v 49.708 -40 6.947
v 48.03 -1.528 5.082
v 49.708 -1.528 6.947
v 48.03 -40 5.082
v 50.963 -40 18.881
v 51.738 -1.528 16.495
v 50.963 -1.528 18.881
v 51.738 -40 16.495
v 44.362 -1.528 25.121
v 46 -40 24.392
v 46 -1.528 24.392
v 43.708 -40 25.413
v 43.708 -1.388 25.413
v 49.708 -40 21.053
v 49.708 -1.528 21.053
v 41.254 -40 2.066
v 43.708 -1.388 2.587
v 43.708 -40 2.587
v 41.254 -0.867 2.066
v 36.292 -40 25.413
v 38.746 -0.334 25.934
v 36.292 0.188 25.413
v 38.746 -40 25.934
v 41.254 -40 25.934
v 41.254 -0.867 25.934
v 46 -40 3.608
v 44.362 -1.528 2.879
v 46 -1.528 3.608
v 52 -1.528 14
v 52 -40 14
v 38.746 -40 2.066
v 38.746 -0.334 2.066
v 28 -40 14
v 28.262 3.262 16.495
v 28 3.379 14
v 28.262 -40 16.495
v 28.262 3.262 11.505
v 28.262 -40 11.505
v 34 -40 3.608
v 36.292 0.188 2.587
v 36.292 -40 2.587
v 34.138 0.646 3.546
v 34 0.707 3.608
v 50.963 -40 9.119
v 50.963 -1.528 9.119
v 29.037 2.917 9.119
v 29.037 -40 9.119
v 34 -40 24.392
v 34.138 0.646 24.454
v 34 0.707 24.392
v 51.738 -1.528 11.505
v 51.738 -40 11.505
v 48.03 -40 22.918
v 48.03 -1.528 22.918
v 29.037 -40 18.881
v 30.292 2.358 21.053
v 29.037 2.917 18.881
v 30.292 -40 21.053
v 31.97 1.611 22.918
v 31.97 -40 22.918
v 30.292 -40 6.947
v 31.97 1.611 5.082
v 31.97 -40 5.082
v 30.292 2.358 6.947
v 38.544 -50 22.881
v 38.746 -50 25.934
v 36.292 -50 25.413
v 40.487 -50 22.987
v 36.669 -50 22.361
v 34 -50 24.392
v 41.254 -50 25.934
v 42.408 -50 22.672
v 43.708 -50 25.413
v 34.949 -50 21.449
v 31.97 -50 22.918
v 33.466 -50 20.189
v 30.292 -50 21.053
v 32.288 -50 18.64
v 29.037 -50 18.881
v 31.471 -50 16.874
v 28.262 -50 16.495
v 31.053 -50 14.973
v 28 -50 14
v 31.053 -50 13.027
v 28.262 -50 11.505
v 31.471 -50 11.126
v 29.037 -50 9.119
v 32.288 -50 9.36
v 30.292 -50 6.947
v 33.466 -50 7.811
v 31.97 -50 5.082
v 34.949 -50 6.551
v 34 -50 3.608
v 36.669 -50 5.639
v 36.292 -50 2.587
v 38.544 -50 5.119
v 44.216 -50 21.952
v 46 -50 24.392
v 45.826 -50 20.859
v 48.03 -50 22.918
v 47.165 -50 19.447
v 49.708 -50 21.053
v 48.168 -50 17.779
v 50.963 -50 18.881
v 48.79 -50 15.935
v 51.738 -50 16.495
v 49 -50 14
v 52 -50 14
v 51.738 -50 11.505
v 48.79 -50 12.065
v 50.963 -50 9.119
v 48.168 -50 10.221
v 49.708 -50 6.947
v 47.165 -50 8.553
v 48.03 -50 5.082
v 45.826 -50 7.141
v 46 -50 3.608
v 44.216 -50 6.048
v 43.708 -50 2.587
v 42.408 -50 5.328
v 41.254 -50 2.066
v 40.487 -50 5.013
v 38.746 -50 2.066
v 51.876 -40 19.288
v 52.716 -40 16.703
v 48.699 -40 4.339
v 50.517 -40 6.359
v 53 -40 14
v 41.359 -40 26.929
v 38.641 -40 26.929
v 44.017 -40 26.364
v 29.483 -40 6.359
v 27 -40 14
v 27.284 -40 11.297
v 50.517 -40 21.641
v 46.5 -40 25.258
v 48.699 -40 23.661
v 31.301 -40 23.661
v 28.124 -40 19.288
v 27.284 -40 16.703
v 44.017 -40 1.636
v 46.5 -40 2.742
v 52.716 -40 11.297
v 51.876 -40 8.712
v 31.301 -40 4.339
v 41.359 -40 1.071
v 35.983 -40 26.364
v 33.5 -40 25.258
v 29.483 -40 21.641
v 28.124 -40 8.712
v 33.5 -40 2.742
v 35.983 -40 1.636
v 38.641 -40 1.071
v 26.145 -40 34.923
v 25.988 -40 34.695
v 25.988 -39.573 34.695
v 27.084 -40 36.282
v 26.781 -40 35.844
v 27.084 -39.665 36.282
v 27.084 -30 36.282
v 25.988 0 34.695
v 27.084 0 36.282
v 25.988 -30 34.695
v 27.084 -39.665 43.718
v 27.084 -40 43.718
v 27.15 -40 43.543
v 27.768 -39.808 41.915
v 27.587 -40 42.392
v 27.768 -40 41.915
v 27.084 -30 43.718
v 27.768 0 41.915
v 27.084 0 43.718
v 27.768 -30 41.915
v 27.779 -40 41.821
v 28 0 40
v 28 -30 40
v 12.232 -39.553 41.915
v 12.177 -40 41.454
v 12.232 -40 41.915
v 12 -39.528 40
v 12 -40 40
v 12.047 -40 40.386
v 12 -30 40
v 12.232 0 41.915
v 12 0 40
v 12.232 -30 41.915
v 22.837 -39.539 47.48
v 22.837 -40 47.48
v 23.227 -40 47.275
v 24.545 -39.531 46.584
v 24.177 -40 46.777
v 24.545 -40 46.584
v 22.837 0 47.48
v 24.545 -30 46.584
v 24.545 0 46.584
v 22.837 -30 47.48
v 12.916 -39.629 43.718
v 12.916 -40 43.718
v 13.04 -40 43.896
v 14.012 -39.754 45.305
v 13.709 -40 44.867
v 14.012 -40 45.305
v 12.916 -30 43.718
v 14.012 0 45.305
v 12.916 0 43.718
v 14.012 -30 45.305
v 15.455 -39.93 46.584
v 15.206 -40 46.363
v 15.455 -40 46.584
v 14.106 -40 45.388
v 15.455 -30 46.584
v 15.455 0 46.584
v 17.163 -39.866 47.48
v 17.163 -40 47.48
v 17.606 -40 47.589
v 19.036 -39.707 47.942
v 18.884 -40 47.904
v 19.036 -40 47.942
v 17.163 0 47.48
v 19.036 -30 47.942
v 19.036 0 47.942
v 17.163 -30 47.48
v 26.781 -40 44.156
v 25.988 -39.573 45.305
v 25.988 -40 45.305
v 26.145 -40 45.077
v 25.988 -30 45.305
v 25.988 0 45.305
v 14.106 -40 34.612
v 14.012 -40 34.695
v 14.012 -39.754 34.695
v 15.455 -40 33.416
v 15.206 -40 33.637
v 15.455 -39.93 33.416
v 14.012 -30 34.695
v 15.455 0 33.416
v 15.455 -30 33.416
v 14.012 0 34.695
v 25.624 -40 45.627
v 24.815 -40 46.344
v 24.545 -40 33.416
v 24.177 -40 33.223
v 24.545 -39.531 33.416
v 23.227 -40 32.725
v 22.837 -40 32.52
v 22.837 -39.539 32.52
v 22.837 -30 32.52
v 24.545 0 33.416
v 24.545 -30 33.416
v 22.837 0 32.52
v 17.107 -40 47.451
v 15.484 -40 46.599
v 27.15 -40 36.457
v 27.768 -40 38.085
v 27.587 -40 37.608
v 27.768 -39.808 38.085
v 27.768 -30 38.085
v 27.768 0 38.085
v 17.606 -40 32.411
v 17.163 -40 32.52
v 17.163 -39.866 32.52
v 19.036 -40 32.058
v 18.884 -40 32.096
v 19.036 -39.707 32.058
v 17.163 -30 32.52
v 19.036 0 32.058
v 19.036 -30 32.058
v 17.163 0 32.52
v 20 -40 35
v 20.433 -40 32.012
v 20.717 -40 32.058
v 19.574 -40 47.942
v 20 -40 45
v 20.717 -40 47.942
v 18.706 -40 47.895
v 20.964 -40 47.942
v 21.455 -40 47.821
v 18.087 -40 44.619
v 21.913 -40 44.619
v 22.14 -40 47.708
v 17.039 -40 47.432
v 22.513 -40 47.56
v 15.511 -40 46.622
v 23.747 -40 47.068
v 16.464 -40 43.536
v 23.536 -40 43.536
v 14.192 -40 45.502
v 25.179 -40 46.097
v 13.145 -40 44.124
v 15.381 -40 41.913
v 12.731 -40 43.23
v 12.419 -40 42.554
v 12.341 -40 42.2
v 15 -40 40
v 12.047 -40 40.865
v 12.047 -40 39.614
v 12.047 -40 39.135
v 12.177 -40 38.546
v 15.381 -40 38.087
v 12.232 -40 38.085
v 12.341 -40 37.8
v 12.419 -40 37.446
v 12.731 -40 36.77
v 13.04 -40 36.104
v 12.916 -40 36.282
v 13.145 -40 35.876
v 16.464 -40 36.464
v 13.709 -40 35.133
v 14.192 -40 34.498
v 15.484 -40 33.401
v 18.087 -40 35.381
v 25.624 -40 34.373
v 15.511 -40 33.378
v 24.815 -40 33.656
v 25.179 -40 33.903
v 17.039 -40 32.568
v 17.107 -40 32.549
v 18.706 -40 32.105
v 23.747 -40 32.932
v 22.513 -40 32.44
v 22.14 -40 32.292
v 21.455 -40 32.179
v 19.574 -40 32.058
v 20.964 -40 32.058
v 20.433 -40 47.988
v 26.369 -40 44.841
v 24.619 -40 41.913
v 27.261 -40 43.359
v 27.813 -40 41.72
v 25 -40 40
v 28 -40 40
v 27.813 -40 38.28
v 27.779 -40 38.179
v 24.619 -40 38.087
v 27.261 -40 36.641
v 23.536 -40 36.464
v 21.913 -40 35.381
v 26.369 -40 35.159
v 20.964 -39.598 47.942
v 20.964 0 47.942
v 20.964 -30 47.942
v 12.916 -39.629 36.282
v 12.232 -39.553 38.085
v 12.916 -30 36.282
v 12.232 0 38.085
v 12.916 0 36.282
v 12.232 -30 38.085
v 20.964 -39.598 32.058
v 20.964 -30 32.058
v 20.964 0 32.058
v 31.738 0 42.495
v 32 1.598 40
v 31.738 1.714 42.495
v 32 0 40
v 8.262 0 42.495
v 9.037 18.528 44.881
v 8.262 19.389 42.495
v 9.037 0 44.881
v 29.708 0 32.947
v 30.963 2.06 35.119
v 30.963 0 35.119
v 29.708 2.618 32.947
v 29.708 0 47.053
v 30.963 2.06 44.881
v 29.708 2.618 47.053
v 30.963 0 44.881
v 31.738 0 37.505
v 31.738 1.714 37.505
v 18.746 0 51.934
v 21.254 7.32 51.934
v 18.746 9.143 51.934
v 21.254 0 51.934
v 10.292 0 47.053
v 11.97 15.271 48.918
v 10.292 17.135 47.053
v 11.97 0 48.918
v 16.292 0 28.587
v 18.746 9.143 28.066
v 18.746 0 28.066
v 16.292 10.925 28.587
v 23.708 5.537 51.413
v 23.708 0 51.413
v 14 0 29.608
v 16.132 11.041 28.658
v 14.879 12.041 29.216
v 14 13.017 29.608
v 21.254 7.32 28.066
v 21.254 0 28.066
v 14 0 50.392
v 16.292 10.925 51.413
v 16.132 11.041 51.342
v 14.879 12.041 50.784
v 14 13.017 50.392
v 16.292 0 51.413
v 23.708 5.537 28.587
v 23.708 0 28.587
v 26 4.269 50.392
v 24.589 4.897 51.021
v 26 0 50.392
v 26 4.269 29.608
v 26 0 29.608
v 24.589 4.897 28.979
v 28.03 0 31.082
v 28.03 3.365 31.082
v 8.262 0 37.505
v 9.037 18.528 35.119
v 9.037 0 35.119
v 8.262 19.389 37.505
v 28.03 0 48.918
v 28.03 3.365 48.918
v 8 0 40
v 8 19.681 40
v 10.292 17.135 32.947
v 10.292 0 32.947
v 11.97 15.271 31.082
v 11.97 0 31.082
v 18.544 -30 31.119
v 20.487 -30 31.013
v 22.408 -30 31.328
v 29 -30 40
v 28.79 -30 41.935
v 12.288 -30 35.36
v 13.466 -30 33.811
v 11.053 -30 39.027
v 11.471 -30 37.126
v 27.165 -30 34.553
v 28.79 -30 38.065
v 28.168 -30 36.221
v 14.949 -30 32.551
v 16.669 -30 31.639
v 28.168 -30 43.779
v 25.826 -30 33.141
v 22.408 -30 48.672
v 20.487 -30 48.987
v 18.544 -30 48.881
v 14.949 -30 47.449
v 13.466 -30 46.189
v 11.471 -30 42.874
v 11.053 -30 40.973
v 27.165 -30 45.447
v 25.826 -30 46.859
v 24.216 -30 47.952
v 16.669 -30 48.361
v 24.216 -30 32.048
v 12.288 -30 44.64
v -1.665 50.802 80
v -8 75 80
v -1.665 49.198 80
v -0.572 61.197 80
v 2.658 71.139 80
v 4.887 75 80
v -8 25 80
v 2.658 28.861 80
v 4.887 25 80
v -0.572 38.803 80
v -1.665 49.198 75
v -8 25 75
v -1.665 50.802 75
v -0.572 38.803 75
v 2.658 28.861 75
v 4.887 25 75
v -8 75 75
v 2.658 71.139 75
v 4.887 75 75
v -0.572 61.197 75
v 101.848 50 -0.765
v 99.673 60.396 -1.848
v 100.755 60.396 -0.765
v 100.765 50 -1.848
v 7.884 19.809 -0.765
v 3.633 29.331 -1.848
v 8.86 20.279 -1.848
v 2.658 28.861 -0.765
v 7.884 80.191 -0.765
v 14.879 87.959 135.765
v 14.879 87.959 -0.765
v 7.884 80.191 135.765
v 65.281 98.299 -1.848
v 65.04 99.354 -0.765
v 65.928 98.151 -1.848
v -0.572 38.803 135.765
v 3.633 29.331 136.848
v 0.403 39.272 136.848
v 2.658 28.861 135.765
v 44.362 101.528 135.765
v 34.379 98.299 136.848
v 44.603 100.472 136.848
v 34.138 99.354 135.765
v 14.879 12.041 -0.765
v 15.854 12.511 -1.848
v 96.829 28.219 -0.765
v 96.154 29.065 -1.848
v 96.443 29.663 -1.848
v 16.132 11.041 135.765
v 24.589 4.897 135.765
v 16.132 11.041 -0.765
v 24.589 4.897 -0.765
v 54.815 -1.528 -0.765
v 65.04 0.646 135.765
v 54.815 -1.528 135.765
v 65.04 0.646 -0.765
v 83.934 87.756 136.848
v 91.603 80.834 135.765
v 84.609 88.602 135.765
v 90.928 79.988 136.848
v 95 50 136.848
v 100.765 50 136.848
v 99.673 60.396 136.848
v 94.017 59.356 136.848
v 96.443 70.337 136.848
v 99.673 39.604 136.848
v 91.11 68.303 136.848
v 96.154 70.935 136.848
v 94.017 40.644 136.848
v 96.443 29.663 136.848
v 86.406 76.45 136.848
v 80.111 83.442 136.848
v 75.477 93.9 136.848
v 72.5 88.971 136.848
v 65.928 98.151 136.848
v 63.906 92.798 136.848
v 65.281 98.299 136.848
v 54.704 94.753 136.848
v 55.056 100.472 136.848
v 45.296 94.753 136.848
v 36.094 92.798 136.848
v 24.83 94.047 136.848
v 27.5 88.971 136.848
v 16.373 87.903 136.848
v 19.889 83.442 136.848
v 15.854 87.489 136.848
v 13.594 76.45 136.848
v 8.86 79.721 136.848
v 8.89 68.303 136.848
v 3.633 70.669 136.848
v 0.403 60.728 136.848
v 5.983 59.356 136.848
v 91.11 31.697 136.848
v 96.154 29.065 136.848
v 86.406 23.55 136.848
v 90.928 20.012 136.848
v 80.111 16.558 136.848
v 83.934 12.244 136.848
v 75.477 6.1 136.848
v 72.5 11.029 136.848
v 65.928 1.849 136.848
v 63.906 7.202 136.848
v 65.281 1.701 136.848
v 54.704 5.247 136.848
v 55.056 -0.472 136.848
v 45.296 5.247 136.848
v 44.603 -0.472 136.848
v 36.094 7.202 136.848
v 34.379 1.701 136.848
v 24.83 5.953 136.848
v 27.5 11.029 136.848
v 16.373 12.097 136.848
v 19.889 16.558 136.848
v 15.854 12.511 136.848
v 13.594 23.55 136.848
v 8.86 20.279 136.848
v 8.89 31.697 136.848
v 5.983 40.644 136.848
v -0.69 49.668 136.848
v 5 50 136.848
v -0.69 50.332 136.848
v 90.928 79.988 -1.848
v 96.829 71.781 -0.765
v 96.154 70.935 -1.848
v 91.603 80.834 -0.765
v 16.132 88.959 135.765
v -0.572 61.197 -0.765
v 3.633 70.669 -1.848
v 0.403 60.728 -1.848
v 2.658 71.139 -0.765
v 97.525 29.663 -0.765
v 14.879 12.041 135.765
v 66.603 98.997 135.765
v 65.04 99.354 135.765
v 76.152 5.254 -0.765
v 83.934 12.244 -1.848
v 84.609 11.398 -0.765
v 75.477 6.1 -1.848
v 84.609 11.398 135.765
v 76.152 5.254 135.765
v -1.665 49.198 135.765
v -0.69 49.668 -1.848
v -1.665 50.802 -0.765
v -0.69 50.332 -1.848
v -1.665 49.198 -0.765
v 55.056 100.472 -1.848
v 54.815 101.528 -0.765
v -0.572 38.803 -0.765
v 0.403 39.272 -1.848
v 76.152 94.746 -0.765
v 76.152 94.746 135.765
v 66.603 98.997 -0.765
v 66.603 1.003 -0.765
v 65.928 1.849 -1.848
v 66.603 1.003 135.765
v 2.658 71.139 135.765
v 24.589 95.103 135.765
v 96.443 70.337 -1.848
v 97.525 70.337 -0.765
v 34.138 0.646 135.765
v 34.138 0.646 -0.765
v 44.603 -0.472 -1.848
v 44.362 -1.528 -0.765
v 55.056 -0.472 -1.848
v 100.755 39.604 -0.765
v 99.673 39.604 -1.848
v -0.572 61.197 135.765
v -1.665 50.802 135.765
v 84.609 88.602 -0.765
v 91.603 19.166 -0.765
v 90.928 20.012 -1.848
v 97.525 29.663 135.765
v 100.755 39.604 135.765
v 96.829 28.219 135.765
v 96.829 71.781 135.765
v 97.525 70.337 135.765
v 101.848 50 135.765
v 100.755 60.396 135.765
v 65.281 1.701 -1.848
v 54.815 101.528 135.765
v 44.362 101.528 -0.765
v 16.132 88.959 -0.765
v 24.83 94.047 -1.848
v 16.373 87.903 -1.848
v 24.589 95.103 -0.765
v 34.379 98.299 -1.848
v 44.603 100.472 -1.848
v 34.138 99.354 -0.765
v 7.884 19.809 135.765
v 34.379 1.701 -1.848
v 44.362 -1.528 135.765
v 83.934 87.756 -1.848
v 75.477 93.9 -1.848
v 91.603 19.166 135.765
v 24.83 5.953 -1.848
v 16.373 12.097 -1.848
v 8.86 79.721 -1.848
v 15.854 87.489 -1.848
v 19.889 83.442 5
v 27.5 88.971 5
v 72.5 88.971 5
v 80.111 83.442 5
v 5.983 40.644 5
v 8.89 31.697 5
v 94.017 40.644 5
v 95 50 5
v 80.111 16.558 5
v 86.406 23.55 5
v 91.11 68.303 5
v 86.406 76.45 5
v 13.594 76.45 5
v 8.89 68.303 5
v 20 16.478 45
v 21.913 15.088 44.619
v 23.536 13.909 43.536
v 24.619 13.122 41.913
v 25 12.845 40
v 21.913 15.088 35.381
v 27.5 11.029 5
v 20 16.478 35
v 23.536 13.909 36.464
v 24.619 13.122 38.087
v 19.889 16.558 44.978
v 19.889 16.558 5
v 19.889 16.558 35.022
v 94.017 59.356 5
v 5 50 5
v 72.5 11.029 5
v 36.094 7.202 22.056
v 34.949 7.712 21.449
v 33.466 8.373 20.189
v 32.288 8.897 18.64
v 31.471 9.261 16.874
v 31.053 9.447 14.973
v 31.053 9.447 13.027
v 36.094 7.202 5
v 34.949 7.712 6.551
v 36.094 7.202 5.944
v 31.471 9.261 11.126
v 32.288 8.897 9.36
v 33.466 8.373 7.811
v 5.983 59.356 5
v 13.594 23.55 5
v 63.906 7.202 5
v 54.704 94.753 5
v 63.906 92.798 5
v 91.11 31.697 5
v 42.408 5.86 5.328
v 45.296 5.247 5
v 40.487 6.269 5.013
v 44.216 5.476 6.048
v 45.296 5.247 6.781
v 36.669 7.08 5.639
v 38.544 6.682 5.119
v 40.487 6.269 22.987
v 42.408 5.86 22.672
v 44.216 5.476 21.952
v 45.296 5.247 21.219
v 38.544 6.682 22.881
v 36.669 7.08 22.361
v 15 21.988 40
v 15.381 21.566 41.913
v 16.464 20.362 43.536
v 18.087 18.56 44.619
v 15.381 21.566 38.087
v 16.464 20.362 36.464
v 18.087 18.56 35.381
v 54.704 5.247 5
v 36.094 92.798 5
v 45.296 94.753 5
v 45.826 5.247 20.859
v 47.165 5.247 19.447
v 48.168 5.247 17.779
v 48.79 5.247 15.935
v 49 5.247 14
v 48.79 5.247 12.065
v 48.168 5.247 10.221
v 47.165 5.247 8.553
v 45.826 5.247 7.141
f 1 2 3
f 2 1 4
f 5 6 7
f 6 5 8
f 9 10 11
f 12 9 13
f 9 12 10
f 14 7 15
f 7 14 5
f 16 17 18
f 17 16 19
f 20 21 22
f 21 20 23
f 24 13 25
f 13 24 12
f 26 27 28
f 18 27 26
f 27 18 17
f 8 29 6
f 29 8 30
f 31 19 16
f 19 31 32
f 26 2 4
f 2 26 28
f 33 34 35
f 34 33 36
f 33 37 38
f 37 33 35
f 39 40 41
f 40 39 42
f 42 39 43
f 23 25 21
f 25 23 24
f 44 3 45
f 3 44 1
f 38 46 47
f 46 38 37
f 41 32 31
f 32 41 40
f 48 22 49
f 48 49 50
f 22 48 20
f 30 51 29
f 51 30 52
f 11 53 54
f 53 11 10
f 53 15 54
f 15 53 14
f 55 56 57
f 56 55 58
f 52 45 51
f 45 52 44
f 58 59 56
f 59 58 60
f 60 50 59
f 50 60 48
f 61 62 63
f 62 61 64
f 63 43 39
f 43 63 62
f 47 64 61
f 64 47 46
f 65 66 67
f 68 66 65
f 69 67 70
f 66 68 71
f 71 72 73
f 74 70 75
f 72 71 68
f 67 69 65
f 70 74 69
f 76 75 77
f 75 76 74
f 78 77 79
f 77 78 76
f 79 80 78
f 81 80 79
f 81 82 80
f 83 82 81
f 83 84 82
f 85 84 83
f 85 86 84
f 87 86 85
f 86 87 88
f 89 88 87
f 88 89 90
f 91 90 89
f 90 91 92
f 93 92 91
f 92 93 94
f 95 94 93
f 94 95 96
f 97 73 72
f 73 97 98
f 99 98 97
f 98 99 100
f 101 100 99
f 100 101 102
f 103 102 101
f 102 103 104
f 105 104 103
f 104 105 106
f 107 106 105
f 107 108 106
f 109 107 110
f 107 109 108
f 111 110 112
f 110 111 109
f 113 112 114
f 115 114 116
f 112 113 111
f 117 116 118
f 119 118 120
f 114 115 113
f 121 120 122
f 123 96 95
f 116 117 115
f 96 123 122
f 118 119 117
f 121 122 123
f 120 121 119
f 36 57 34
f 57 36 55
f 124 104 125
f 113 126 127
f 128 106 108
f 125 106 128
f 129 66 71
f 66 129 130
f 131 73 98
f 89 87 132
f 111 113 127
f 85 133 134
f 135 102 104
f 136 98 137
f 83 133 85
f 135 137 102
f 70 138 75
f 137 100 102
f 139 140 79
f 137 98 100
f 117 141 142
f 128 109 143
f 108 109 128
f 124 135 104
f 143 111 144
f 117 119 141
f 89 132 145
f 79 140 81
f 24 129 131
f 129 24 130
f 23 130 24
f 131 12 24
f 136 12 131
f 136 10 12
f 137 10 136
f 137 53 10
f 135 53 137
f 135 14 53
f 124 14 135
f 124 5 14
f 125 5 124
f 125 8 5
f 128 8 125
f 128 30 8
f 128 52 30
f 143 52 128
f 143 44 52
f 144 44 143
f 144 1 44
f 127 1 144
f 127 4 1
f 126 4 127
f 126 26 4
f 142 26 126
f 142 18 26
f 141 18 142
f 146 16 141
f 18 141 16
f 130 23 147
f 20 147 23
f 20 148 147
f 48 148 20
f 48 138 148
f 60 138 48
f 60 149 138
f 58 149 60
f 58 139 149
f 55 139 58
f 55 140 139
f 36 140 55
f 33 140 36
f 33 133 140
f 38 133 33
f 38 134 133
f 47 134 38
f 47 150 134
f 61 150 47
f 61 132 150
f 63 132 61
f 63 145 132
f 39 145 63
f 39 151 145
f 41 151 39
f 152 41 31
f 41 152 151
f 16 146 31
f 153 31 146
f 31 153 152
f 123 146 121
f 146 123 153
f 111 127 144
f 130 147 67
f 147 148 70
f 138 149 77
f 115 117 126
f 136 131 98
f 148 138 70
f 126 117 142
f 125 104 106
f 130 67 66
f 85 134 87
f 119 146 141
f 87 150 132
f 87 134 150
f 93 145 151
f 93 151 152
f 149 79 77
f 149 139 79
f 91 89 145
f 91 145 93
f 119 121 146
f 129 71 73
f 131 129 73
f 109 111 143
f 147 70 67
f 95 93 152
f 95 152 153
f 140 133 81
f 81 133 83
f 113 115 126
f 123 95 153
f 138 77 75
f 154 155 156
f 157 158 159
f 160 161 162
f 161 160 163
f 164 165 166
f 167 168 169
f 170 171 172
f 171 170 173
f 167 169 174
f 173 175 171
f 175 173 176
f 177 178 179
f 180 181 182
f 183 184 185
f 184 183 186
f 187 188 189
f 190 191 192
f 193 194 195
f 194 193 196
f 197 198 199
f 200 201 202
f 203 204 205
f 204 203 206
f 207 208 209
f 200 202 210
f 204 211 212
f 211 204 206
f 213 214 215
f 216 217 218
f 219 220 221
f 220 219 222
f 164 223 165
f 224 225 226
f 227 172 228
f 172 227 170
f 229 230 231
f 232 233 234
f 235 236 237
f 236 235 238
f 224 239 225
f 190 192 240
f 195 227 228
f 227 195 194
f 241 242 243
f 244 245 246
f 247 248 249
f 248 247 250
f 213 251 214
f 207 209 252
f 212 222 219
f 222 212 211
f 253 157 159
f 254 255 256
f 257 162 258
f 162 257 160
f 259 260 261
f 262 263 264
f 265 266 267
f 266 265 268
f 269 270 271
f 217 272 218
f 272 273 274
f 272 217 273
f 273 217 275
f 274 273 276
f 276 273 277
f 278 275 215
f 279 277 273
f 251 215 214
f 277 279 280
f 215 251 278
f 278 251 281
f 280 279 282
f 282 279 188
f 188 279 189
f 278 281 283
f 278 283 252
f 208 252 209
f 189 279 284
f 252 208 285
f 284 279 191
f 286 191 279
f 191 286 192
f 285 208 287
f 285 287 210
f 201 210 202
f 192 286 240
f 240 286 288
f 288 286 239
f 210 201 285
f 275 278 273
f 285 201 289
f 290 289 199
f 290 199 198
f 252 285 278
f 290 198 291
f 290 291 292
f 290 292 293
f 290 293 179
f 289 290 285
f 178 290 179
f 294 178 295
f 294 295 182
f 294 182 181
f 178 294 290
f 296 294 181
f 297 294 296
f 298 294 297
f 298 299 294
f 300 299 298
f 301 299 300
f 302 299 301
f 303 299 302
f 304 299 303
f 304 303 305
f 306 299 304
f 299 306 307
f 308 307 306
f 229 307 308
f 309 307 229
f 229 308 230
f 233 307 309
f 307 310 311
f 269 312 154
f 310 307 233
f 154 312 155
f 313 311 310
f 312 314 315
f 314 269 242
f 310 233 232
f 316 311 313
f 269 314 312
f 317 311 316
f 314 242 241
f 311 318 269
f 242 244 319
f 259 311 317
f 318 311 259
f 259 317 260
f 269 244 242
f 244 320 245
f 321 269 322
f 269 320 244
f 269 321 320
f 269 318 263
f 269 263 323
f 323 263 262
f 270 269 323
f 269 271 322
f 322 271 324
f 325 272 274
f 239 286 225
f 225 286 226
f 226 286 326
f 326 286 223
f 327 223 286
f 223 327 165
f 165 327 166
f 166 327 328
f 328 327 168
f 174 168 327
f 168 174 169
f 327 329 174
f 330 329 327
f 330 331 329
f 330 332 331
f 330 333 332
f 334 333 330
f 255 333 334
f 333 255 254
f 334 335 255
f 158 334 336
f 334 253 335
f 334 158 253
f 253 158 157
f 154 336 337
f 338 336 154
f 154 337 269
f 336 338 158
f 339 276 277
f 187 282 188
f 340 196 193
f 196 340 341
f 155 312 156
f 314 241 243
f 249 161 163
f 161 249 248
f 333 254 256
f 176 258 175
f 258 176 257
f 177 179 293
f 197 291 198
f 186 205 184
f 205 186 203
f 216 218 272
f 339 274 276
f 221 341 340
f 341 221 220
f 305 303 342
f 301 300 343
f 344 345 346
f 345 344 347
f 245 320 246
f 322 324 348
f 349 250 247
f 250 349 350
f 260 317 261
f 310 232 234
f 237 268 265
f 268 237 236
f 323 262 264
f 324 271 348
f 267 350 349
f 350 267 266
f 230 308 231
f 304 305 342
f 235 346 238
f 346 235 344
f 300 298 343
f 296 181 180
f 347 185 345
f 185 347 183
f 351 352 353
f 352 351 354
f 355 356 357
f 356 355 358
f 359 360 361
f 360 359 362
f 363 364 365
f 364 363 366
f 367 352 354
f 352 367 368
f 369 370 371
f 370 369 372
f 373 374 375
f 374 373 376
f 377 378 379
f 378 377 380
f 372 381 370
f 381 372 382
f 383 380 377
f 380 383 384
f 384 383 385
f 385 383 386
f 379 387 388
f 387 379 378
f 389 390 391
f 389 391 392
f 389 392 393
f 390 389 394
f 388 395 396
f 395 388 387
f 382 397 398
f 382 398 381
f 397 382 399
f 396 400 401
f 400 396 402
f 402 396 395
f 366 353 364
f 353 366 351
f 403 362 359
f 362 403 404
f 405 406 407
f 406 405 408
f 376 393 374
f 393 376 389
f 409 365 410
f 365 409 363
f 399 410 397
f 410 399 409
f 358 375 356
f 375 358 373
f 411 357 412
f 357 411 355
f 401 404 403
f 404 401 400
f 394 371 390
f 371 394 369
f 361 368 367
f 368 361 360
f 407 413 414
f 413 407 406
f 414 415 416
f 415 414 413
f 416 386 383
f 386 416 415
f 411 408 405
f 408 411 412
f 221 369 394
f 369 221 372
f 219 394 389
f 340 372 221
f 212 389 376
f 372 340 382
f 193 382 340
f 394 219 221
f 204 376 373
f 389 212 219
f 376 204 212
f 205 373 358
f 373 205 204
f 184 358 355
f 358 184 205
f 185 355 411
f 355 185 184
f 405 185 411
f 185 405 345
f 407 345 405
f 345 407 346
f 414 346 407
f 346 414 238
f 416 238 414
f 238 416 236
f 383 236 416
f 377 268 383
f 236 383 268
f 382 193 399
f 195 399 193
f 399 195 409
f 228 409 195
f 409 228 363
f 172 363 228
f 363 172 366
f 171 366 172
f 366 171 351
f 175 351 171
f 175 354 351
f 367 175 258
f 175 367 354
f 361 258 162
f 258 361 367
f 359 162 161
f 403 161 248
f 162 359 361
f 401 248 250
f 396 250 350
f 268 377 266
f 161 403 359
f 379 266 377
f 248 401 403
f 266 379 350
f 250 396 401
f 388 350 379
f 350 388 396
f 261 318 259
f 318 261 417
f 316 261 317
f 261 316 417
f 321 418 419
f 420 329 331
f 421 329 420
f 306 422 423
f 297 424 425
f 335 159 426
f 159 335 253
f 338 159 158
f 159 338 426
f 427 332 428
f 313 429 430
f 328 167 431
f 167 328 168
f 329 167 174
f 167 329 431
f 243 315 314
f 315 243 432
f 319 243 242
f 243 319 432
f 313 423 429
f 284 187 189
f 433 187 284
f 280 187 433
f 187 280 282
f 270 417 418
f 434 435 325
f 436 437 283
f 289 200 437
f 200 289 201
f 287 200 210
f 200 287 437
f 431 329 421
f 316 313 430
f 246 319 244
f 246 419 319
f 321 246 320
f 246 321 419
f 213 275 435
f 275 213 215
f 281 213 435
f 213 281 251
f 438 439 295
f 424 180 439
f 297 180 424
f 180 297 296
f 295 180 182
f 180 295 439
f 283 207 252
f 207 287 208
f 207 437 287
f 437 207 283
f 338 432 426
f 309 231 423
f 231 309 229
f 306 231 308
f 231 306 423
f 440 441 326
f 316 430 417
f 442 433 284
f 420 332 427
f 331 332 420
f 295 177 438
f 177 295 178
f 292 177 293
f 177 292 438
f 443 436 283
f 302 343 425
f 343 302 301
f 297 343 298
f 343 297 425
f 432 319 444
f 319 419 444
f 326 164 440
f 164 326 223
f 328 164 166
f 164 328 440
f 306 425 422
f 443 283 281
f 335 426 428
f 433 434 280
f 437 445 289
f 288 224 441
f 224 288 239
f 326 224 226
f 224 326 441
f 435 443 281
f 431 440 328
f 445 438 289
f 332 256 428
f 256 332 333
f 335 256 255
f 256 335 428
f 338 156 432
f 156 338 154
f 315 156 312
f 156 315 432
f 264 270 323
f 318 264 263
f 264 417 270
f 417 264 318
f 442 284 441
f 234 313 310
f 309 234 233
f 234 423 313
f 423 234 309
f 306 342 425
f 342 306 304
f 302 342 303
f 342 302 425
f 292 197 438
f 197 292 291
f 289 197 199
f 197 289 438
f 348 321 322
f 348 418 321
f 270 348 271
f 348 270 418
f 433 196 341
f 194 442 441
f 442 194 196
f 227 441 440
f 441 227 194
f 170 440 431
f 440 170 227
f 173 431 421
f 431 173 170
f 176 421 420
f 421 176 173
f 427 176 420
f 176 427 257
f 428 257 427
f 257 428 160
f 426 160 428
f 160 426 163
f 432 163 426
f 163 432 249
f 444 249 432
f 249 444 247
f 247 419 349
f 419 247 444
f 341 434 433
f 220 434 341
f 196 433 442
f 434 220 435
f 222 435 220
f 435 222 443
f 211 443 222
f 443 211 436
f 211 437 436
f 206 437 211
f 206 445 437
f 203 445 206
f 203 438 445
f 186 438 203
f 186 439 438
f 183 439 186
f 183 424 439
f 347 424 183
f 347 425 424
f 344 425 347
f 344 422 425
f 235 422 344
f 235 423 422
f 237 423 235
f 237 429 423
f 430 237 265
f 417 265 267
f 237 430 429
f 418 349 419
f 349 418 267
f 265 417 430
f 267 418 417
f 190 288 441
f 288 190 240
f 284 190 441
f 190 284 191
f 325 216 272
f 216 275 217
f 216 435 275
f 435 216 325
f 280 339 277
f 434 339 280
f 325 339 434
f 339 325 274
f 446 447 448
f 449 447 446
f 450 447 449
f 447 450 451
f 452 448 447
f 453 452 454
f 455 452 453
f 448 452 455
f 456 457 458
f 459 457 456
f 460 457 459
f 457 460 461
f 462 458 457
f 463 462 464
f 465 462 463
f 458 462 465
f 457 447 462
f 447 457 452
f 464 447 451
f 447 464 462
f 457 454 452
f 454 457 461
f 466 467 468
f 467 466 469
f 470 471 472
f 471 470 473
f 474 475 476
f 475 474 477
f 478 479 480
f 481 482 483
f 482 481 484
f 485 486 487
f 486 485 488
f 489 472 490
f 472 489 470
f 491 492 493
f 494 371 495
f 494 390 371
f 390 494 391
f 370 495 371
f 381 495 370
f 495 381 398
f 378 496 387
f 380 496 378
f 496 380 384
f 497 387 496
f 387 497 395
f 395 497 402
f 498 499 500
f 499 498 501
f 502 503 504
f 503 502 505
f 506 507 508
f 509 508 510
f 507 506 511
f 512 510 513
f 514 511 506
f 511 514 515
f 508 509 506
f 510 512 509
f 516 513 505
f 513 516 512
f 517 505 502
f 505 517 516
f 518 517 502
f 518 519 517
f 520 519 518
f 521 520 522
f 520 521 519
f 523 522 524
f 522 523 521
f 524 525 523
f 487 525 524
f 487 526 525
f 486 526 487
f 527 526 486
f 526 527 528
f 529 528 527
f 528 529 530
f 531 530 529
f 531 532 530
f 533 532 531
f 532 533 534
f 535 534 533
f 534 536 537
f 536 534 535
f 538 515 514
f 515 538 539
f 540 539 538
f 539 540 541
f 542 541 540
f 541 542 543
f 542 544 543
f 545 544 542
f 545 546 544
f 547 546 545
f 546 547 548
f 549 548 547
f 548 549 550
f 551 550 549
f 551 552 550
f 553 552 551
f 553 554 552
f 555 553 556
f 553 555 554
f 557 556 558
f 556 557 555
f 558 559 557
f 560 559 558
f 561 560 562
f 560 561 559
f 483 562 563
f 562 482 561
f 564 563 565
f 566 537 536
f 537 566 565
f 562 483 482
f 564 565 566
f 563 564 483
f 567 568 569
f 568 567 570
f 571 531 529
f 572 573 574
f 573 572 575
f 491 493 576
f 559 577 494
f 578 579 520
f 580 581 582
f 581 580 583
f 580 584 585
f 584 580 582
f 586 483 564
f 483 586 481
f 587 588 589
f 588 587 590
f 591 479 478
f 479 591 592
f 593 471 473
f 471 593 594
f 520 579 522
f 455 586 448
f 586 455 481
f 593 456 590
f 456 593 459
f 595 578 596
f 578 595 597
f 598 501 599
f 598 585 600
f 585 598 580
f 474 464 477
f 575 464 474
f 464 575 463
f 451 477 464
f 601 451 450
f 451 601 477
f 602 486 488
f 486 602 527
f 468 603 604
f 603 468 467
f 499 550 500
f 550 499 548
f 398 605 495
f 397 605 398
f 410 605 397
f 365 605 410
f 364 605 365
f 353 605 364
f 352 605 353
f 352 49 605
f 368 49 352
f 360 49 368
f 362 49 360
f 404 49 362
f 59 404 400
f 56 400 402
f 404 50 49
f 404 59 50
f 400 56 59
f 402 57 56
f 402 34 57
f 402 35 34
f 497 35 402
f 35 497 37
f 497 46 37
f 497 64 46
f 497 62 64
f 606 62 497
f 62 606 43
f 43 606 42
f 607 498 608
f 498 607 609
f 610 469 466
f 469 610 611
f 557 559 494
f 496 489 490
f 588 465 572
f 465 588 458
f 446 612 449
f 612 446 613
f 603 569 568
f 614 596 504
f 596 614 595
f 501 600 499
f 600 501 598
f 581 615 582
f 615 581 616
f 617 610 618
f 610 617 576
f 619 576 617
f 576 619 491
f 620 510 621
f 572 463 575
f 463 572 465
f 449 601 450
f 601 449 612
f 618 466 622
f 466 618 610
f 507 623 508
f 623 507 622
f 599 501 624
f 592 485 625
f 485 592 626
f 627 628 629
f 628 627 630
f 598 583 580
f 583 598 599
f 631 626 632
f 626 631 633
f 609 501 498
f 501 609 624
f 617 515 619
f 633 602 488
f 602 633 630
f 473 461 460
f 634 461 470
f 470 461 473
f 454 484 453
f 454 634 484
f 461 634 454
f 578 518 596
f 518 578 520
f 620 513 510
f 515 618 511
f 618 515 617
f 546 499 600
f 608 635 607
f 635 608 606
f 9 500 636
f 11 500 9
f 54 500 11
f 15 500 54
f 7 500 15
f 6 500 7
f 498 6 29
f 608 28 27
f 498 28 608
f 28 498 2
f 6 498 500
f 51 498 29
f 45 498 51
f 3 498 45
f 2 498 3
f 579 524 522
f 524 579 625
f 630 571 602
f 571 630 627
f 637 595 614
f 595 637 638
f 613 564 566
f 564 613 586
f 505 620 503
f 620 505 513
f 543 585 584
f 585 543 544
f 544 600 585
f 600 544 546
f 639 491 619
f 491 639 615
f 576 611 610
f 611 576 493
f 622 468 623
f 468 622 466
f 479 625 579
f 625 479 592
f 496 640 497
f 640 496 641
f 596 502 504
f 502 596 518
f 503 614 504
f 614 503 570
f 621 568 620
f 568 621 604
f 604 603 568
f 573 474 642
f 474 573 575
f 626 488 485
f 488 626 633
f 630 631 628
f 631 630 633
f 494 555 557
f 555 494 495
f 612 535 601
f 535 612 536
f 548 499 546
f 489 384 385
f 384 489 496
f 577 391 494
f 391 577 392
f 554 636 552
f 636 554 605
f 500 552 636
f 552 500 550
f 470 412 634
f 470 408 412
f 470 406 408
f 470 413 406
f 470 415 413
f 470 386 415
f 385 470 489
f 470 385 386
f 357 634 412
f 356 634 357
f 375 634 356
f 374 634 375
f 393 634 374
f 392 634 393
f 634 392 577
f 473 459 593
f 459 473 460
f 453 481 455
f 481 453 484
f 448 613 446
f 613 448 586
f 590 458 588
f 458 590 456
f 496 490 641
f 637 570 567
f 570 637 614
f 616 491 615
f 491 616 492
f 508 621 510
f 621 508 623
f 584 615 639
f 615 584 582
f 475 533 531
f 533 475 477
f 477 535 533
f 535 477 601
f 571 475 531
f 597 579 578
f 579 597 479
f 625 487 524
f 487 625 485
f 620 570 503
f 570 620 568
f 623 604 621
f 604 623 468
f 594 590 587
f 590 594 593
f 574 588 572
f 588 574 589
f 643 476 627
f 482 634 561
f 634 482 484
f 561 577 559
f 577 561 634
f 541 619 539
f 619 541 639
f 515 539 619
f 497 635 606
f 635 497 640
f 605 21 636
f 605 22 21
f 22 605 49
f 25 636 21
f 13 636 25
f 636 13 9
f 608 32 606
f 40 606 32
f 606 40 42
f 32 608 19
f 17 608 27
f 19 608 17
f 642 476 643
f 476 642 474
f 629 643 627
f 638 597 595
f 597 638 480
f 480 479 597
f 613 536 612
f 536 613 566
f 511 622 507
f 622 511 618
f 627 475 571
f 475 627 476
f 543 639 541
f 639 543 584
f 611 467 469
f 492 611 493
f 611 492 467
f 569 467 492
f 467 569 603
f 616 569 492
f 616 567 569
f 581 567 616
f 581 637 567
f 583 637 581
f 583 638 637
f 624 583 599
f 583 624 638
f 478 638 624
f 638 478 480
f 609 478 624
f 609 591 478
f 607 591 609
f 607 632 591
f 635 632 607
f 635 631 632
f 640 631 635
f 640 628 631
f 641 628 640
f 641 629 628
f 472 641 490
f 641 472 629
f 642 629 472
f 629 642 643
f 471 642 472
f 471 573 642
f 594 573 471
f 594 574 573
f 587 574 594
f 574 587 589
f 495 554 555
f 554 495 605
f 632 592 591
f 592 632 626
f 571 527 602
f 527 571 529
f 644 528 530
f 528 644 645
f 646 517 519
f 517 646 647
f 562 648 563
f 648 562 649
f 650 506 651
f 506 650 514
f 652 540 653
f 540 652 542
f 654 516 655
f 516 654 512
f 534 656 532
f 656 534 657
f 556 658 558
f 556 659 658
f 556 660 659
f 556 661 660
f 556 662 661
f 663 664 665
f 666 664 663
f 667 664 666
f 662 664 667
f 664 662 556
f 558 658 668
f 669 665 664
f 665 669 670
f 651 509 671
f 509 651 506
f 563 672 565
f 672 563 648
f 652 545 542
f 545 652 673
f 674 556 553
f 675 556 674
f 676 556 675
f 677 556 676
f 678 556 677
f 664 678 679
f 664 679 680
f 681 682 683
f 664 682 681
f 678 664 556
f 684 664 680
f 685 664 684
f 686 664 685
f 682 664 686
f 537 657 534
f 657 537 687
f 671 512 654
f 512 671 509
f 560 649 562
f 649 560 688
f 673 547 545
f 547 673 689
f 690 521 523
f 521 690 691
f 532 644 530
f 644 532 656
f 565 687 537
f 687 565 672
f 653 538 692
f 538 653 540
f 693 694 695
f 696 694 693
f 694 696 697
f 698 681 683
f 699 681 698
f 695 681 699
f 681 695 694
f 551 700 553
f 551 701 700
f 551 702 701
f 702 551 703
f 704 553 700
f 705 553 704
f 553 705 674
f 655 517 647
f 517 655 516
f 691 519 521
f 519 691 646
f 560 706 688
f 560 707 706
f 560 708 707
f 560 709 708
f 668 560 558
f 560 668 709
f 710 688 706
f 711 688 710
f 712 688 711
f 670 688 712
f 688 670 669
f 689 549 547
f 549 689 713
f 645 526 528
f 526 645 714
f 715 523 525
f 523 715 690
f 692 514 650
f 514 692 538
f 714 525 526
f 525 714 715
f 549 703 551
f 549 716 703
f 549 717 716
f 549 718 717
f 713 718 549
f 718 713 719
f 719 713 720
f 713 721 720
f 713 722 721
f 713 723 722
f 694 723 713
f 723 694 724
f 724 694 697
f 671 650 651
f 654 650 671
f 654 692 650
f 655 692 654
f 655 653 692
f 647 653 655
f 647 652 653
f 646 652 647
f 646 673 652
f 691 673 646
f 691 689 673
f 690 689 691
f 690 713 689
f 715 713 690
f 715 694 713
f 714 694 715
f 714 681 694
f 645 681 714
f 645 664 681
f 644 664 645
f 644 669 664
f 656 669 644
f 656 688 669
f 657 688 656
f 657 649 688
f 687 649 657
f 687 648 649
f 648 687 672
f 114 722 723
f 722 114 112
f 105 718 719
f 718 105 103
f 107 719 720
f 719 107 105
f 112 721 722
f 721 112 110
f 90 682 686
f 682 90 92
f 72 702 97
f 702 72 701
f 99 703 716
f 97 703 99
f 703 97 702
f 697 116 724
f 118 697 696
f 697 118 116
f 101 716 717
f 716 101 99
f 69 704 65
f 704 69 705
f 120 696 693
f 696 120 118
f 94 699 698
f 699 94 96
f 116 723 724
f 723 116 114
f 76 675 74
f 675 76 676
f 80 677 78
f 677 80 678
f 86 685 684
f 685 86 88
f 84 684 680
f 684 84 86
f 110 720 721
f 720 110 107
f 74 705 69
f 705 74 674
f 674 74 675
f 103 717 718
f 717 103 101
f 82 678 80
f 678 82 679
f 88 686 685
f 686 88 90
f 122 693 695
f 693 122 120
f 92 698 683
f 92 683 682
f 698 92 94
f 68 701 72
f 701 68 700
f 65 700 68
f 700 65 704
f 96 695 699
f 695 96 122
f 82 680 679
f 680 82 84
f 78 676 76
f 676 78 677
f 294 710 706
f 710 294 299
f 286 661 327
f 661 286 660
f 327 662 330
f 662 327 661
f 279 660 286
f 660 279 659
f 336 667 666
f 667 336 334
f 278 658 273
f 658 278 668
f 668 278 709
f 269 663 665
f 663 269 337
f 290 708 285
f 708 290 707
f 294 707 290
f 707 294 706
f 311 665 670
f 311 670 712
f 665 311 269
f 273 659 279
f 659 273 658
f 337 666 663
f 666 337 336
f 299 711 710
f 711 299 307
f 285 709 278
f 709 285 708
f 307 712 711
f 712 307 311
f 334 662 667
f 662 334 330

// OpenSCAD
reservoir_height = 135;
reservoir_radius = 50;

small_fitting_radius = 8;
small_fitting_length = 65;
small_fitting_offset_x = 30;
small_fitting_offset_z = 40;

large_fitting_radius = 12;
large_fitting_length = 75;
large_fitting_offset_x = 10;
large_fitting_offset_z = 14;

container_thickness = 5;

difference () {        
    union () {
        rotate([90, 0, 0])
            translate([reservoir_radius - large_fitting_offset_x, large_fitting_offset_z, -25])
                cylinder(r=large_fitting_radius, h=large_fitting_length);
        
        rotate([90, 0, 0])
            translate([reservoir_radius - large_fitting_offset_x, large_fitting_offset_z, 40])
                cylinder(r2=large_fitting_radius, r1=large_fitting_radius+1, h=10);
     
        rotate([90, 0, 0])
            translate([reservoir_radius-30, small_fitting_offset_z, -25])
                cylinder(r=small_fitting_radius, h=small_fitting_length);
        
        rotate([90, 0, 0])
            translate([reservoir_radius-30, small_fitting_offset_z, -25])
                cylinder(r=small_fitting_radius+4, h=25);
        
        rotate([90, 0, 0])
            translate([reservoir_radius-30, small_fitting_offset_z, small_fitting_length -35])
                cylinder(r2=small_fitting_radius, r1=small_fitting_radius+1, h=10);
        
        translate([-8, 25, 75]) cube([15, 50, container_thickness]);
            
            
        minkowski () {
            translate([reservoir_radius, reservoir_radius, 0])
                cylinder(r=reservoir_radius, h=reservoir_height);
            sphere(r=2);
       }
    }
    
    translate([reservoir_radius, reservoir_radius, container_thickness])
        cylinder(r=reservoir_radius-container_thickness, h=reservoir_height + container_thickness + 1);
    
    rotate([90, 0, 0])
        translate([reservoir_radius - large_fitting_offset_x, large_fitting_offset_z, -25])
            cylinder(r=large_fitting_radius-3, h=large_fitting_length+1);
 
    rotate([90, 0, 0])
        translate([reservoir_radius-30, small_fitting_offset_z, -25])
            cylinder(r=small_fitting_radius-3, h=small_fitting_length+1);
}
